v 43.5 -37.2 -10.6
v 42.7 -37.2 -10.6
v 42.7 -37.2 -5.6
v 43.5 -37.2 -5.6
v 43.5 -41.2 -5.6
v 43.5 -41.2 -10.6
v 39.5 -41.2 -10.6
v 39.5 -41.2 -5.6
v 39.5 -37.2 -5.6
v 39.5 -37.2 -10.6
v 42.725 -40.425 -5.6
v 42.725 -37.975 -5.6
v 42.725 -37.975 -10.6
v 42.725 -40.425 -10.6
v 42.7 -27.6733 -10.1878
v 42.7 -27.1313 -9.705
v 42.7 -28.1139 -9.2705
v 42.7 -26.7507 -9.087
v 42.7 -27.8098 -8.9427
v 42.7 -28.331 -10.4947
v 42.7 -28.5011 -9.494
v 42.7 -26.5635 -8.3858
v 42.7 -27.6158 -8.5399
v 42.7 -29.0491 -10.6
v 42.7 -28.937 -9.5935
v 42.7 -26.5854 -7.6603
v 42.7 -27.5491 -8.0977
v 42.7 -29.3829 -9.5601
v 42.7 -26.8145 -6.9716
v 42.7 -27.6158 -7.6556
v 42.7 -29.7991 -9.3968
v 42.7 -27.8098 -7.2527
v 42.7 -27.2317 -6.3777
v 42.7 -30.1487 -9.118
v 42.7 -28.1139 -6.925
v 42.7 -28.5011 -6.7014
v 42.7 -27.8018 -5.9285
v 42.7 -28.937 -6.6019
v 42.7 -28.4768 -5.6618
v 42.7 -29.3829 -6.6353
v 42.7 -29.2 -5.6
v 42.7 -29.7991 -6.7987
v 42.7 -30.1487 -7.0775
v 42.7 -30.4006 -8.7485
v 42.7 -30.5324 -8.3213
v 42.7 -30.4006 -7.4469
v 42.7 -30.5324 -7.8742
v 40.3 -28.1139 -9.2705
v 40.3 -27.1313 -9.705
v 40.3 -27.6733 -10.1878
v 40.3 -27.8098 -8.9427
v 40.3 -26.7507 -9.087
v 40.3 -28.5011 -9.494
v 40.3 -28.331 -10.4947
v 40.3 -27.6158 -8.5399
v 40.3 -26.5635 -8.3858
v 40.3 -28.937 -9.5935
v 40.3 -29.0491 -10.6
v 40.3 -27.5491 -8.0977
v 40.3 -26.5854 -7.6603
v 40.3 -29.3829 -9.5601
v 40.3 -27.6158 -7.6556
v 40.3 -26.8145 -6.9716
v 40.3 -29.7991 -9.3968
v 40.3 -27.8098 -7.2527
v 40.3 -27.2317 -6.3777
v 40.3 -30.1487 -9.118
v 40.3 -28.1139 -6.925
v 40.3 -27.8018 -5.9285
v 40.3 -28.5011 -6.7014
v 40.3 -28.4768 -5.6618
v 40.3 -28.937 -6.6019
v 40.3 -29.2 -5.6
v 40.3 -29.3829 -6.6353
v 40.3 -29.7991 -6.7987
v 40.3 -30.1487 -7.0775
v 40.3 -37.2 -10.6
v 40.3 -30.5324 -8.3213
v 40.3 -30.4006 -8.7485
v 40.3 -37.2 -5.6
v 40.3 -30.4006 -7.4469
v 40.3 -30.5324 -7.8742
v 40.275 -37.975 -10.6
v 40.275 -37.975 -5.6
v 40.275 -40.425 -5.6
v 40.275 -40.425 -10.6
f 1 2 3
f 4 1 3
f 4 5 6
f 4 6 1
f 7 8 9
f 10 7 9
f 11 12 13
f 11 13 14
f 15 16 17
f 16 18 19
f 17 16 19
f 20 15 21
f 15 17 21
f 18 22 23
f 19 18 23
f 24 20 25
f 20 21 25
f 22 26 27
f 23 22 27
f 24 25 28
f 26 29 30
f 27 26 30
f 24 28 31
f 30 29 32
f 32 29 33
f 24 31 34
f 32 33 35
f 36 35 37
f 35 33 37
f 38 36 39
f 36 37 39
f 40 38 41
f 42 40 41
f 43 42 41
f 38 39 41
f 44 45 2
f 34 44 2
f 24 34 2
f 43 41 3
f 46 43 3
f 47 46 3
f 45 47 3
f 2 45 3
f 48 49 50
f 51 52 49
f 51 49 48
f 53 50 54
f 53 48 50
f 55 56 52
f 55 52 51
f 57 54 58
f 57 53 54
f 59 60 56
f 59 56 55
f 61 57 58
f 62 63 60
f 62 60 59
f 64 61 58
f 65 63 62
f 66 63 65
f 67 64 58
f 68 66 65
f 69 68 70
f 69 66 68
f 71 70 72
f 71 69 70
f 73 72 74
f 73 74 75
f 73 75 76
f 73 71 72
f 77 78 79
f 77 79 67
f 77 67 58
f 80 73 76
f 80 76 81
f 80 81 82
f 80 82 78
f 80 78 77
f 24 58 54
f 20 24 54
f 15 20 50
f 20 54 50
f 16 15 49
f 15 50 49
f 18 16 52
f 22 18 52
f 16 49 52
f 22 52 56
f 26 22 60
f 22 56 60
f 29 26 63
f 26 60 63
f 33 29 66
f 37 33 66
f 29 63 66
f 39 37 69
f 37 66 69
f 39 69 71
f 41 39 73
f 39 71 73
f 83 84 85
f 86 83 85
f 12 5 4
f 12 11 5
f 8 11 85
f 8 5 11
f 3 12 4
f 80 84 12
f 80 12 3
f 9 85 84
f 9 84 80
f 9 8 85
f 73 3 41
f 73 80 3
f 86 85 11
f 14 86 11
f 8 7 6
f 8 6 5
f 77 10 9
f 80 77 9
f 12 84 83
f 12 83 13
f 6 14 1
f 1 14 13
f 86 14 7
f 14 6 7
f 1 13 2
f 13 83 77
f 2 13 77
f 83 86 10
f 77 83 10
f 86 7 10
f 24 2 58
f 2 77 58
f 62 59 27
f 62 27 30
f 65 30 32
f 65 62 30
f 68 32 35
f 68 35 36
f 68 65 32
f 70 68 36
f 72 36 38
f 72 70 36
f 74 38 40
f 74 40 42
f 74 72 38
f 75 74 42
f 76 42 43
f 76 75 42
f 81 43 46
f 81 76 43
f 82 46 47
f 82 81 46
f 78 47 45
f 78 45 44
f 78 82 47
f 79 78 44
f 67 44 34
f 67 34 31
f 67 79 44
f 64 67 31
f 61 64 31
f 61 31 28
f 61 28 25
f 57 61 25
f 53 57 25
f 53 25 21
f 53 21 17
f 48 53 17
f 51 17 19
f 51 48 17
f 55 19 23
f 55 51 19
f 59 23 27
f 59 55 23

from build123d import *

# Parameters (mm, degrees)
SKETCH018_R             = 1.5
PAD012_DEPTH            = 2.4
BOX008_W                = 4
BOX008_H                = 5
BOX008_DEPTH            = 4
SKETCH019_W             = 2.45
SKETCH019_H             = 2.45
POCKET009_DEPTH         = 5.001
BODY005_PLACEMENT_ANGLE = 90


with BuildPart() as part:
    # Sketch018 → Pad012 (new body)
    with BuildSketch(Plane.XZ):
        with BuildLine():
            Line((-6, 5), (6, 5))
            ThreePointArc((6.150876, 0), (8.652014, 2.577748), (6, 5))
            Line((6.150876, 0), (-6, 0))
            Line((-6, 0), (-6, 5))
        make_face()
        with Locations((6.150876, 2.502276)):
            Circle(SKETCH018_R, mode=Mode.SUBTRACT)
    extrude(amount=PAD012_DEPTH)

    # Box008 → Box008 (join)
    with BuildSketch(Plane(origin=(-6, 0.8, 0), x_dir=(1, 0, 0), z_dir=(0, -1, 0))):
        with Locations((2, 2.5)):
            Rectangle(BOX008_W, BOX008_H)
    extrude(amount=BOX008_DEPTH)

    # Sketch019 (on Face13 of Box008) → Pocket009 (cut, through all)
    with BuildSketch(Plane(origin=(-6, 0.8, 5), x_dir=(-1, 0, 0), z_dir=(0, 0, 1))):
        with Locations((-2, 2)):
            Rectangle(SKETCH019_W, SKETCH019_H)
    extrude(amount=-POCKET009_DEPTH, mode=Mode.SUBTRACT)


with BuildPart() as part_1:
    # Body005 placement: moved
    add(part.part.moved(Location((40.3, -35.2, -10.6))).rotate(Axis((40.3, -35.2, -10.6), (0, 0, 1)), BODY005_PLACEMENT_ANGLE))


solid = part_1.part
